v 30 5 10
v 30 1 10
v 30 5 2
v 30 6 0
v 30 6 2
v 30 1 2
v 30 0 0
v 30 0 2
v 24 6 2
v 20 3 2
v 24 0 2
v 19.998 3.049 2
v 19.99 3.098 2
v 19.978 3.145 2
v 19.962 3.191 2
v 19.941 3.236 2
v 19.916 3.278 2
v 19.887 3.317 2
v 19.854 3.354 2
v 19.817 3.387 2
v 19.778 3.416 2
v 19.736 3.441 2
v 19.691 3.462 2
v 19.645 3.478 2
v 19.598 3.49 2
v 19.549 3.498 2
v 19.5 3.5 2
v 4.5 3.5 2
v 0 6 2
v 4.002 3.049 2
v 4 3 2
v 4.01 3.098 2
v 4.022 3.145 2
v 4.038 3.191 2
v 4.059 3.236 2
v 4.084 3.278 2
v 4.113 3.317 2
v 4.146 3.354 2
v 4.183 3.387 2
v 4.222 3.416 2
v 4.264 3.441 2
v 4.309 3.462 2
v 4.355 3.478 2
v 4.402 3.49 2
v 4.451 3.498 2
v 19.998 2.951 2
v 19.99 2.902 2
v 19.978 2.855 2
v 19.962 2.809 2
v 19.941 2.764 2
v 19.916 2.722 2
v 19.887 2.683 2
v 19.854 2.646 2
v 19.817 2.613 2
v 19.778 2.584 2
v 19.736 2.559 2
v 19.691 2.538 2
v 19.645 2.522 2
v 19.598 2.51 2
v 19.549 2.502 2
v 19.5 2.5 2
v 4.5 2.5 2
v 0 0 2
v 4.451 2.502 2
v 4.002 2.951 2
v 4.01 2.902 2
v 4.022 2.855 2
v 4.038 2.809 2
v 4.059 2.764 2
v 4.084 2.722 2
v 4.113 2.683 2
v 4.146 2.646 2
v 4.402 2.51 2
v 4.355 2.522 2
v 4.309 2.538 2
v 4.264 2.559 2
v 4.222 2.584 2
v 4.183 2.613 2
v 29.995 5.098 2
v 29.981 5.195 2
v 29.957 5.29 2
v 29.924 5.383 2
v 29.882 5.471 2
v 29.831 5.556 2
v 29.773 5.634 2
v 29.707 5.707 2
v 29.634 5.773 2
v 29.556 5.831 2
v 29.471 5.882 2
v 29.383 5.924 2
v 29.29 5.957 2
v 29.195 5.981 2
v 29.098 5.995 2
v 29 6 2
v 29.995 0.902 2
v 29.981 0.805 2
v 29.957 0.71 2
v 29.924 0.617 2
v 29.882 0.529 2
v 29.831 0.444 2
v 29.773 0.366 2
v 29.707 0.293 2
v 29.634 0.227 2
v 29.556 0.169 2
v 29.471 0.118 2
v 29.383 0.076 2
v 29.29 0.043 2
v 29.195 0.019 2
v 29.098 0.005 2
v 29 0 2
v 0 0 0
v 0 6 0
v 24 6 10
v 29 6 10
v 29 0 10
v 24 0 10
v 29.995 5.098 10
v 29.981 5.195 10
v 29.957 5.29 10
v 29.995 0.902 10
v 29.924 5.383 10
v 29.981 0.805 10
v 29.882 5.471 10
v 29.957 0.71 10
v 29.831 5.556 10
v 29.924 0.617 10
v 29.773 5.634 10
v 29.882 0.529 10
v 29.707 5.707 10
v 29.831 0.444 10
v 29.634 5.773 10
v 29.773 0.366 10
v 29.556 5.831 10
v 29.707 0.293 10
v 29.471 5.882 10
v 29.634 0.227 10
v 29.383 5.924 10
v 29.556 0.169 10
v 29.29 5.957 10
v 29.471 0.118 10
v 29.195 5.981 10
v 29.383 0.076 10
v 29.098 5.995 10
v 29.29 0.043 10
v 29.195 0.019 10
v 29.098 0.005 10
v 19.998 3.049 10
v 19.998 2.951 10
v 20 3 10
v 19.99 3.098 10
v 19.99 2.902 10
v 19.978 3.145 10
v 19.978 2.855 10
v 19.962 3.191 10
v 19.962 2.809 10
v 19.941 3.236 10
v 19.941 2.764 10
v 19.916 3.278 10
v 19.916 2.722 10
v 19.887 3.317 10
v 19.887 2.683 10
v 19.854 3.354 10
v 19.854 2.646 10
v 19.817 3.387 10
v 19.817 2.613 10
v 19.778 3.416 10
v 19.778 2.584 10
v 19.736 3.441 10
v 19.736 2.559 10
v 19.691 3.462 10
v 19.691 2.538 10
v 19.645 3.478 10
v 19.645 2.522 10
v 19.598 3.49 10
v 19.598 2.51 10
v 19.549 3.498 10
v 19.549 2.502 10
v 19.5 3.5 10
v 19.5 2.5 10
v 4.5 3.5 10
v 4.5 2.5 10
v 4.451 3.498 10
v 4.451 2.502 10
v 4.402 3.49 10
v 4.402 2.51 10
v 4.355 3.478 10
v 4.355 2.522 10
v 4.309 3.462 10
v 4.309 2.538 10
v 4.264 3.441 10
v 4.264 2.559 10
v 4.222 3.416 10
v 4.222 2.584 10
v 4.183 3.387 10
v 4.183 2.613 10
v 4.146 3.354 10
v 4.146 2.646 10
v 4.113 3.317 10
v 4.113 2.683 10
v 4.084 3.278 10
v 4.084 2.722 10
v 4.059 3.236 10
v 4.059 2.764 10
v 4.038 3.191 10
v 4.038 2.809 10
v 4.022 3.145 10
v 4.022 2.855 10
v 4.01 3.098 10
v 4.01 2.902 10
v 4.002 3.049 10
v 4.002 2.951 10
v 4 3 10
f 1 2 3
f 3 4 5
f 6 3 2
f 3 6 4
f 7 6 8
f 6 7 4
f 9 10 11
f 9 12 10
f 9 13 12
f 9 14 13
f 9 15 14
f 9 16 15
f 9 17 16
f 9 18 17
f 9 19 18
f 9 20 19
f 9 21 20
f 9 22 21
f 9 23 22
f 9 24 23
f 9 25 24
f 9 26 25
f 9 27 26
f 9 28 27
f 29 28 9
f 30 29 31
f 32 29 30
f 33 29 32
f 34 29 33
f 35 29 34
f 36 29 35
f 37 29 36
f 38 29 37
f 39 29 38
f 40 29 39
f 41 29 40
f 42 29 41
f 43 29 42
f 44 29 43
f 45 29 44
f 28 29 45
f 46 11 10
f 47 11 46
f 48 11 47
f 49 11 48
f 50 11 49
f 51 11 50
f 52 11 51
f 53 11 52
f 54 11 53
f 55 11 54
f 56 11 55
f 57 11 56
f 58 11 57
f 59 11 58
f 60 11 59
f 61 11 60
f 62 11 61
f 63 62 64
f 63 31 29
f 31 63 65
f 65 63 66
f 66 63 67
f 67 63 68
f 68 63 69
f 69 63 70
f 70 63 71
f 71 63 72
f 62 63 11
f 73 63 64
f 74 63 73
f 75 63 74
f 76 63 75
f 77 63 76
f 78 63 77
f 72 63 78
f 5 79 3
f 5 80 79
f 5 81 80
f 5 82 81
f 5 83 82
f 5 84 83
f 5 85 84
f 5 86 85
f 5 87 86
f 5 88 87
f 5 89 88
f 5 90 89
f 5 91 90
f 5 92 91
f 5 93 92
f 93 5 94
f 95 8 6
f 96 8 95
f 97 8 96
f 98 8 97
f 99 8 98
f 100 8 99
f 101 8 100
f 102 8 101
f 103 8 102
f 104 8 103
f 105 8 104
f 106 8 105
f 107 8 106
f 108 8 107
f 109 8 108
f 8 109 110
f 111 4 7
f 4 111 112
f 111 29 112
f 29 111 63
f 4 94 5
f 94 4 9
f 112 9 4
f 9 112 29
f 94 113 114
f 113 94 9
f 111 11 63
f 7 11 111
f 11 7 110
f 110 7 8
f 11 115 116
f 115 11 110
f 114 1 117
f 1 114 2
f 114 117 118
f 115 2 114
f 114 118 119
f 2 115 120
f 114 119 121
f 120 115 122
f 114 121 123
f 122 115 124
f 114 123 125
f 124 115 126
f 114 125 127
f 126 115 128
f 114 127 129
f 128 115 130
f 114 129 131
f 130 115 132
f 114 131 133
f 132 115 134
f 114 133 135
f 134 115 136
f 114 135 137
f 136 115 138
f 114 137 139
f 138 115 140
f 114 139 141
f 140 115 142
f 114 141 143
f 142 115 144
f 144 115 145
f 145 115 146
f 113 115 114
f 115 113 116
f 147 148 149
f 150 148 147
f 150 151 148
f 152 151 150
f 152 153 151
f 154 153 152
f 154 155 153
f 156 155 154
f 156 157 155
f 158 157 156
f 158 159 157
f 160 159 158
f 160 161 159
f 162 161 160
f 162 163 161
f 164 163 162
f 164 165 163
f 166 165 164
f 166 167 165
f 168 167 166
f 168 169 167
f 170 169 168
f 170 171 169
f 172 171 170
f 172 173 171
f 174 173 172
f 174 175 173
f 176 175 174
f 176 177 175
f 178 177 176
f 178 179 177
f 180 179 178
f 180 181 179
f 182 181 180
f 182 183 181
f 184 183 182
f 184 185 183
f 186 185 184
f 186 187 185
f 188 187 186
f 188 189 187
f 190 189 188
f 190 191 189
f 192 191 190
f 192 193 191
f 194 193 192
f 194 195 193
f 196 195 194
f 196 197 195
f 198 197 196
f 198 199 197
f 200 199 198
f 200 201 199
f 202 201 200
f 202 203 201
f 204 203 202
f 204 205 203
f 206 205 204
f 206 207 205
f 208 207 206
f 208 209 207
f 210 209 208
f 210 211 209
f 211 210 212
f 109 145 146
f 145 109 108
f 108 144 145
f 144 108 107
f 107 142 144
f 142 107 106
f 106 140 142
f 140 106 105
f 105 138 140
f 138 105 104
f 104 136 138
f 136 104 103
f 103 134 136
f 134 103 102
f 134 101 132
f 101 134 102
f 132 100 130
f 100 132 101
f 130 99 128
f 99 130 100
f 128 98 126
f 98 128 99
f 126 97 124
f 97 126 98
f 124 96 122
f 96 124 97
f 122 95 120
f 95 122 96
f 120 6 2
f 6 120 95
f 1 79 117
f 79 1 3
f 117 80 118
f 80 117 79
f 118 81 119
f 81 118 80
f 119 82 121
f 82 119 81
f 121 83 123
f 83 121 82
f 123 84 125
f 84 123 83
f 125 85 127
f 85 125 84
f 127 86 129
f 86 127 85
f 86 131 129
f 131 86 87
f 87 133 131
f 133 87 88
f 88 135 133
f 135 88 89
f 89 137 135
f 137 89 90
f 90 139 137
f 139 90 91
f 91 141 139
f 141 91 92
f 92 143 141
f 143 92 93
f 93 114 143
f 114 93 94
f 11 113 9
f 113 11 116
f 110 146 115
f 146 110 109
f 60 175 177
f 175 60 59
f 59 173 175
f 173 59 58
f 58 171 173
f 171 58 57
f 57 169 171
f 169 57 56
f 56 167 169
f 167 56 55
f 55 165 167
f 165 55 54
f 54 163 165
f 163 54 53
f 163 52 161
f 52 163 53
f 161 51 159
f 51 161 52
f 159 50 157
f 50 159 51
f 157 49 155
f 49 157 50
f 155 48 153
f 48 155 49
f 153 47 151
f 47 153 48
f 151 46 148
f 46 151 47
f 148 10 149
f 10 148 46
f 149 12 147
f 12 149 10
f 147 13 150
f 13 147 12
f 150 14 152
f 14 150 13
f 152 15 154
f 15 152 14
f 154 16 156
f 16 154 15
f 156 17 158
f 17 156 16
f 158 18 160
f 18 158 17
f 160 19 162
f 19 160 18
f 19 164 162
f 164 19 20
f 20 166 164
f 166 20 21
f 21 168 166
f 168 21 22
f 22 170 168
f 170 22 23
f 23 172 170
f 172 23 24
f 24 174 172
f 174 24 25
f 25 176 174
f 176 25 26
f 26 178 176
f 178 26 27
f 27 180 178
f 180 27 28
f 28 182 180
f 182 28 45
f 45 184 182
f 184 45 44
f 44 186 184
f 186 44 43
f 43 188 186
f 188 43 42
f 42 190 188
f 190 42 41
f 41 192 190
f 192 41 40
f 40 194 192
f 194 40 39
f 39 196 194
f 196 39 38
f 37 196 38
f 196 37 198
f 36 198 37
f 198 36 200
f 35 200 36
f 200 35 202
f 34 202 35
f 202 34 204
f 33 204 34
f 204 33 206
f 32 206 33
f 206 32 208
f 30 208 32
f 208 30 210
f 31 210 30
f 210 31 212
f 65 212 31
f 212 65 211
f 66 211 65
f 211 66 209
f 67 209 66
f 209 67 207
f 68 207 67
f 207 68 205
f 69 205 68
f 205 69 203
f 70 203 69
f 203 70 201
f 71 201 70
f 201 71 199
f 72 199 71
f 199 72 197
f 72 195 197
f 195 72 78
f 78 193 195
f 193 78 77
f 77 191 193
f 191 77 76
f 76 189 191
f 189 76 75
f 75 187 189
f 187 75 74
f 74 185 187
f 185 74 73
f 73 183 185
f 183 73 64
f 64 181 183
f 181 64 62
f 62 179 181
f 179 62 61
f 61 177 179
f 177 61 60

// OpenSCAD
// Lower bar is rectangular; the head's two free-end corners round above it.
// Rib x bounds are its OUTER stadium bounds, including both half-round ends.
$fn = 64;
body_length = 30;
body_width = 6;
head_length = 6;
step_1_height = 2;
step_2_height = 10;
corner_1_radius = 1;
corner_2_radius = 1;
corner_3_radius = 0.5;
corner_4_radius = 0.5;
rib_start = 4;
rib_end = 20;

module stepped_bar(body_length=30, body_width=6, head_length=6,
                    step_1_height=2, step_2_height=10,
                    corner_1_radius=1, corner_2_radius=1,
                    corner_3_radius=0.5, corner_4_radius=0.5,
                    rib_start=4, rib_end=20) {
    r1=corner_1_radius; r2=corner_2_radius;
    q1=corner_3_radius; q2=corner_4_radius;
    assert(0<step_1_height && step_1_height<step_2_height);
    assert(min(body_length,body_width,head_length,r1,r2,q1,q2)>0);
    assert(max(r1,r2)<min(head_length,body_width/2));
    assert(rib_start>0 && rib_end<body_length-head_length);
    assert(q1+q2<rib_end-rib_start && 2*max(q1,q2)<body_width);
    union() {
        cube([body_length,body_width,step_1_height]);
        translate([0,0,step_1_height]) linear_extrude(height=step_2_height-step_1_height) {
            // Head: square west end and rounded east end.
            hull() {
                translate([body_length-head_length,0]) square([head_length-max(r1,r2),body_width]);
                translate([body_length-r1,r1]) circle(r=r1);
                translate([body_length-r2,body_width-r2]) circle(r=r2);
            }
            // Stadium: centers one radius in from the specified outer bounds.
            hull() {
                translate([rib_start+q1,body_width/2]) circle(r=q1);
                translate([rib_end-q2,body_width/2]) circle(r=q2);
            }
        }
    }
}

stepped_bar(body_length,body_width,head_length,step_1_height,step_2_height,
    corner_1_radius,corner_2_radius,corner_3_radius,corner_4_radius,rib_start,rib_end);
